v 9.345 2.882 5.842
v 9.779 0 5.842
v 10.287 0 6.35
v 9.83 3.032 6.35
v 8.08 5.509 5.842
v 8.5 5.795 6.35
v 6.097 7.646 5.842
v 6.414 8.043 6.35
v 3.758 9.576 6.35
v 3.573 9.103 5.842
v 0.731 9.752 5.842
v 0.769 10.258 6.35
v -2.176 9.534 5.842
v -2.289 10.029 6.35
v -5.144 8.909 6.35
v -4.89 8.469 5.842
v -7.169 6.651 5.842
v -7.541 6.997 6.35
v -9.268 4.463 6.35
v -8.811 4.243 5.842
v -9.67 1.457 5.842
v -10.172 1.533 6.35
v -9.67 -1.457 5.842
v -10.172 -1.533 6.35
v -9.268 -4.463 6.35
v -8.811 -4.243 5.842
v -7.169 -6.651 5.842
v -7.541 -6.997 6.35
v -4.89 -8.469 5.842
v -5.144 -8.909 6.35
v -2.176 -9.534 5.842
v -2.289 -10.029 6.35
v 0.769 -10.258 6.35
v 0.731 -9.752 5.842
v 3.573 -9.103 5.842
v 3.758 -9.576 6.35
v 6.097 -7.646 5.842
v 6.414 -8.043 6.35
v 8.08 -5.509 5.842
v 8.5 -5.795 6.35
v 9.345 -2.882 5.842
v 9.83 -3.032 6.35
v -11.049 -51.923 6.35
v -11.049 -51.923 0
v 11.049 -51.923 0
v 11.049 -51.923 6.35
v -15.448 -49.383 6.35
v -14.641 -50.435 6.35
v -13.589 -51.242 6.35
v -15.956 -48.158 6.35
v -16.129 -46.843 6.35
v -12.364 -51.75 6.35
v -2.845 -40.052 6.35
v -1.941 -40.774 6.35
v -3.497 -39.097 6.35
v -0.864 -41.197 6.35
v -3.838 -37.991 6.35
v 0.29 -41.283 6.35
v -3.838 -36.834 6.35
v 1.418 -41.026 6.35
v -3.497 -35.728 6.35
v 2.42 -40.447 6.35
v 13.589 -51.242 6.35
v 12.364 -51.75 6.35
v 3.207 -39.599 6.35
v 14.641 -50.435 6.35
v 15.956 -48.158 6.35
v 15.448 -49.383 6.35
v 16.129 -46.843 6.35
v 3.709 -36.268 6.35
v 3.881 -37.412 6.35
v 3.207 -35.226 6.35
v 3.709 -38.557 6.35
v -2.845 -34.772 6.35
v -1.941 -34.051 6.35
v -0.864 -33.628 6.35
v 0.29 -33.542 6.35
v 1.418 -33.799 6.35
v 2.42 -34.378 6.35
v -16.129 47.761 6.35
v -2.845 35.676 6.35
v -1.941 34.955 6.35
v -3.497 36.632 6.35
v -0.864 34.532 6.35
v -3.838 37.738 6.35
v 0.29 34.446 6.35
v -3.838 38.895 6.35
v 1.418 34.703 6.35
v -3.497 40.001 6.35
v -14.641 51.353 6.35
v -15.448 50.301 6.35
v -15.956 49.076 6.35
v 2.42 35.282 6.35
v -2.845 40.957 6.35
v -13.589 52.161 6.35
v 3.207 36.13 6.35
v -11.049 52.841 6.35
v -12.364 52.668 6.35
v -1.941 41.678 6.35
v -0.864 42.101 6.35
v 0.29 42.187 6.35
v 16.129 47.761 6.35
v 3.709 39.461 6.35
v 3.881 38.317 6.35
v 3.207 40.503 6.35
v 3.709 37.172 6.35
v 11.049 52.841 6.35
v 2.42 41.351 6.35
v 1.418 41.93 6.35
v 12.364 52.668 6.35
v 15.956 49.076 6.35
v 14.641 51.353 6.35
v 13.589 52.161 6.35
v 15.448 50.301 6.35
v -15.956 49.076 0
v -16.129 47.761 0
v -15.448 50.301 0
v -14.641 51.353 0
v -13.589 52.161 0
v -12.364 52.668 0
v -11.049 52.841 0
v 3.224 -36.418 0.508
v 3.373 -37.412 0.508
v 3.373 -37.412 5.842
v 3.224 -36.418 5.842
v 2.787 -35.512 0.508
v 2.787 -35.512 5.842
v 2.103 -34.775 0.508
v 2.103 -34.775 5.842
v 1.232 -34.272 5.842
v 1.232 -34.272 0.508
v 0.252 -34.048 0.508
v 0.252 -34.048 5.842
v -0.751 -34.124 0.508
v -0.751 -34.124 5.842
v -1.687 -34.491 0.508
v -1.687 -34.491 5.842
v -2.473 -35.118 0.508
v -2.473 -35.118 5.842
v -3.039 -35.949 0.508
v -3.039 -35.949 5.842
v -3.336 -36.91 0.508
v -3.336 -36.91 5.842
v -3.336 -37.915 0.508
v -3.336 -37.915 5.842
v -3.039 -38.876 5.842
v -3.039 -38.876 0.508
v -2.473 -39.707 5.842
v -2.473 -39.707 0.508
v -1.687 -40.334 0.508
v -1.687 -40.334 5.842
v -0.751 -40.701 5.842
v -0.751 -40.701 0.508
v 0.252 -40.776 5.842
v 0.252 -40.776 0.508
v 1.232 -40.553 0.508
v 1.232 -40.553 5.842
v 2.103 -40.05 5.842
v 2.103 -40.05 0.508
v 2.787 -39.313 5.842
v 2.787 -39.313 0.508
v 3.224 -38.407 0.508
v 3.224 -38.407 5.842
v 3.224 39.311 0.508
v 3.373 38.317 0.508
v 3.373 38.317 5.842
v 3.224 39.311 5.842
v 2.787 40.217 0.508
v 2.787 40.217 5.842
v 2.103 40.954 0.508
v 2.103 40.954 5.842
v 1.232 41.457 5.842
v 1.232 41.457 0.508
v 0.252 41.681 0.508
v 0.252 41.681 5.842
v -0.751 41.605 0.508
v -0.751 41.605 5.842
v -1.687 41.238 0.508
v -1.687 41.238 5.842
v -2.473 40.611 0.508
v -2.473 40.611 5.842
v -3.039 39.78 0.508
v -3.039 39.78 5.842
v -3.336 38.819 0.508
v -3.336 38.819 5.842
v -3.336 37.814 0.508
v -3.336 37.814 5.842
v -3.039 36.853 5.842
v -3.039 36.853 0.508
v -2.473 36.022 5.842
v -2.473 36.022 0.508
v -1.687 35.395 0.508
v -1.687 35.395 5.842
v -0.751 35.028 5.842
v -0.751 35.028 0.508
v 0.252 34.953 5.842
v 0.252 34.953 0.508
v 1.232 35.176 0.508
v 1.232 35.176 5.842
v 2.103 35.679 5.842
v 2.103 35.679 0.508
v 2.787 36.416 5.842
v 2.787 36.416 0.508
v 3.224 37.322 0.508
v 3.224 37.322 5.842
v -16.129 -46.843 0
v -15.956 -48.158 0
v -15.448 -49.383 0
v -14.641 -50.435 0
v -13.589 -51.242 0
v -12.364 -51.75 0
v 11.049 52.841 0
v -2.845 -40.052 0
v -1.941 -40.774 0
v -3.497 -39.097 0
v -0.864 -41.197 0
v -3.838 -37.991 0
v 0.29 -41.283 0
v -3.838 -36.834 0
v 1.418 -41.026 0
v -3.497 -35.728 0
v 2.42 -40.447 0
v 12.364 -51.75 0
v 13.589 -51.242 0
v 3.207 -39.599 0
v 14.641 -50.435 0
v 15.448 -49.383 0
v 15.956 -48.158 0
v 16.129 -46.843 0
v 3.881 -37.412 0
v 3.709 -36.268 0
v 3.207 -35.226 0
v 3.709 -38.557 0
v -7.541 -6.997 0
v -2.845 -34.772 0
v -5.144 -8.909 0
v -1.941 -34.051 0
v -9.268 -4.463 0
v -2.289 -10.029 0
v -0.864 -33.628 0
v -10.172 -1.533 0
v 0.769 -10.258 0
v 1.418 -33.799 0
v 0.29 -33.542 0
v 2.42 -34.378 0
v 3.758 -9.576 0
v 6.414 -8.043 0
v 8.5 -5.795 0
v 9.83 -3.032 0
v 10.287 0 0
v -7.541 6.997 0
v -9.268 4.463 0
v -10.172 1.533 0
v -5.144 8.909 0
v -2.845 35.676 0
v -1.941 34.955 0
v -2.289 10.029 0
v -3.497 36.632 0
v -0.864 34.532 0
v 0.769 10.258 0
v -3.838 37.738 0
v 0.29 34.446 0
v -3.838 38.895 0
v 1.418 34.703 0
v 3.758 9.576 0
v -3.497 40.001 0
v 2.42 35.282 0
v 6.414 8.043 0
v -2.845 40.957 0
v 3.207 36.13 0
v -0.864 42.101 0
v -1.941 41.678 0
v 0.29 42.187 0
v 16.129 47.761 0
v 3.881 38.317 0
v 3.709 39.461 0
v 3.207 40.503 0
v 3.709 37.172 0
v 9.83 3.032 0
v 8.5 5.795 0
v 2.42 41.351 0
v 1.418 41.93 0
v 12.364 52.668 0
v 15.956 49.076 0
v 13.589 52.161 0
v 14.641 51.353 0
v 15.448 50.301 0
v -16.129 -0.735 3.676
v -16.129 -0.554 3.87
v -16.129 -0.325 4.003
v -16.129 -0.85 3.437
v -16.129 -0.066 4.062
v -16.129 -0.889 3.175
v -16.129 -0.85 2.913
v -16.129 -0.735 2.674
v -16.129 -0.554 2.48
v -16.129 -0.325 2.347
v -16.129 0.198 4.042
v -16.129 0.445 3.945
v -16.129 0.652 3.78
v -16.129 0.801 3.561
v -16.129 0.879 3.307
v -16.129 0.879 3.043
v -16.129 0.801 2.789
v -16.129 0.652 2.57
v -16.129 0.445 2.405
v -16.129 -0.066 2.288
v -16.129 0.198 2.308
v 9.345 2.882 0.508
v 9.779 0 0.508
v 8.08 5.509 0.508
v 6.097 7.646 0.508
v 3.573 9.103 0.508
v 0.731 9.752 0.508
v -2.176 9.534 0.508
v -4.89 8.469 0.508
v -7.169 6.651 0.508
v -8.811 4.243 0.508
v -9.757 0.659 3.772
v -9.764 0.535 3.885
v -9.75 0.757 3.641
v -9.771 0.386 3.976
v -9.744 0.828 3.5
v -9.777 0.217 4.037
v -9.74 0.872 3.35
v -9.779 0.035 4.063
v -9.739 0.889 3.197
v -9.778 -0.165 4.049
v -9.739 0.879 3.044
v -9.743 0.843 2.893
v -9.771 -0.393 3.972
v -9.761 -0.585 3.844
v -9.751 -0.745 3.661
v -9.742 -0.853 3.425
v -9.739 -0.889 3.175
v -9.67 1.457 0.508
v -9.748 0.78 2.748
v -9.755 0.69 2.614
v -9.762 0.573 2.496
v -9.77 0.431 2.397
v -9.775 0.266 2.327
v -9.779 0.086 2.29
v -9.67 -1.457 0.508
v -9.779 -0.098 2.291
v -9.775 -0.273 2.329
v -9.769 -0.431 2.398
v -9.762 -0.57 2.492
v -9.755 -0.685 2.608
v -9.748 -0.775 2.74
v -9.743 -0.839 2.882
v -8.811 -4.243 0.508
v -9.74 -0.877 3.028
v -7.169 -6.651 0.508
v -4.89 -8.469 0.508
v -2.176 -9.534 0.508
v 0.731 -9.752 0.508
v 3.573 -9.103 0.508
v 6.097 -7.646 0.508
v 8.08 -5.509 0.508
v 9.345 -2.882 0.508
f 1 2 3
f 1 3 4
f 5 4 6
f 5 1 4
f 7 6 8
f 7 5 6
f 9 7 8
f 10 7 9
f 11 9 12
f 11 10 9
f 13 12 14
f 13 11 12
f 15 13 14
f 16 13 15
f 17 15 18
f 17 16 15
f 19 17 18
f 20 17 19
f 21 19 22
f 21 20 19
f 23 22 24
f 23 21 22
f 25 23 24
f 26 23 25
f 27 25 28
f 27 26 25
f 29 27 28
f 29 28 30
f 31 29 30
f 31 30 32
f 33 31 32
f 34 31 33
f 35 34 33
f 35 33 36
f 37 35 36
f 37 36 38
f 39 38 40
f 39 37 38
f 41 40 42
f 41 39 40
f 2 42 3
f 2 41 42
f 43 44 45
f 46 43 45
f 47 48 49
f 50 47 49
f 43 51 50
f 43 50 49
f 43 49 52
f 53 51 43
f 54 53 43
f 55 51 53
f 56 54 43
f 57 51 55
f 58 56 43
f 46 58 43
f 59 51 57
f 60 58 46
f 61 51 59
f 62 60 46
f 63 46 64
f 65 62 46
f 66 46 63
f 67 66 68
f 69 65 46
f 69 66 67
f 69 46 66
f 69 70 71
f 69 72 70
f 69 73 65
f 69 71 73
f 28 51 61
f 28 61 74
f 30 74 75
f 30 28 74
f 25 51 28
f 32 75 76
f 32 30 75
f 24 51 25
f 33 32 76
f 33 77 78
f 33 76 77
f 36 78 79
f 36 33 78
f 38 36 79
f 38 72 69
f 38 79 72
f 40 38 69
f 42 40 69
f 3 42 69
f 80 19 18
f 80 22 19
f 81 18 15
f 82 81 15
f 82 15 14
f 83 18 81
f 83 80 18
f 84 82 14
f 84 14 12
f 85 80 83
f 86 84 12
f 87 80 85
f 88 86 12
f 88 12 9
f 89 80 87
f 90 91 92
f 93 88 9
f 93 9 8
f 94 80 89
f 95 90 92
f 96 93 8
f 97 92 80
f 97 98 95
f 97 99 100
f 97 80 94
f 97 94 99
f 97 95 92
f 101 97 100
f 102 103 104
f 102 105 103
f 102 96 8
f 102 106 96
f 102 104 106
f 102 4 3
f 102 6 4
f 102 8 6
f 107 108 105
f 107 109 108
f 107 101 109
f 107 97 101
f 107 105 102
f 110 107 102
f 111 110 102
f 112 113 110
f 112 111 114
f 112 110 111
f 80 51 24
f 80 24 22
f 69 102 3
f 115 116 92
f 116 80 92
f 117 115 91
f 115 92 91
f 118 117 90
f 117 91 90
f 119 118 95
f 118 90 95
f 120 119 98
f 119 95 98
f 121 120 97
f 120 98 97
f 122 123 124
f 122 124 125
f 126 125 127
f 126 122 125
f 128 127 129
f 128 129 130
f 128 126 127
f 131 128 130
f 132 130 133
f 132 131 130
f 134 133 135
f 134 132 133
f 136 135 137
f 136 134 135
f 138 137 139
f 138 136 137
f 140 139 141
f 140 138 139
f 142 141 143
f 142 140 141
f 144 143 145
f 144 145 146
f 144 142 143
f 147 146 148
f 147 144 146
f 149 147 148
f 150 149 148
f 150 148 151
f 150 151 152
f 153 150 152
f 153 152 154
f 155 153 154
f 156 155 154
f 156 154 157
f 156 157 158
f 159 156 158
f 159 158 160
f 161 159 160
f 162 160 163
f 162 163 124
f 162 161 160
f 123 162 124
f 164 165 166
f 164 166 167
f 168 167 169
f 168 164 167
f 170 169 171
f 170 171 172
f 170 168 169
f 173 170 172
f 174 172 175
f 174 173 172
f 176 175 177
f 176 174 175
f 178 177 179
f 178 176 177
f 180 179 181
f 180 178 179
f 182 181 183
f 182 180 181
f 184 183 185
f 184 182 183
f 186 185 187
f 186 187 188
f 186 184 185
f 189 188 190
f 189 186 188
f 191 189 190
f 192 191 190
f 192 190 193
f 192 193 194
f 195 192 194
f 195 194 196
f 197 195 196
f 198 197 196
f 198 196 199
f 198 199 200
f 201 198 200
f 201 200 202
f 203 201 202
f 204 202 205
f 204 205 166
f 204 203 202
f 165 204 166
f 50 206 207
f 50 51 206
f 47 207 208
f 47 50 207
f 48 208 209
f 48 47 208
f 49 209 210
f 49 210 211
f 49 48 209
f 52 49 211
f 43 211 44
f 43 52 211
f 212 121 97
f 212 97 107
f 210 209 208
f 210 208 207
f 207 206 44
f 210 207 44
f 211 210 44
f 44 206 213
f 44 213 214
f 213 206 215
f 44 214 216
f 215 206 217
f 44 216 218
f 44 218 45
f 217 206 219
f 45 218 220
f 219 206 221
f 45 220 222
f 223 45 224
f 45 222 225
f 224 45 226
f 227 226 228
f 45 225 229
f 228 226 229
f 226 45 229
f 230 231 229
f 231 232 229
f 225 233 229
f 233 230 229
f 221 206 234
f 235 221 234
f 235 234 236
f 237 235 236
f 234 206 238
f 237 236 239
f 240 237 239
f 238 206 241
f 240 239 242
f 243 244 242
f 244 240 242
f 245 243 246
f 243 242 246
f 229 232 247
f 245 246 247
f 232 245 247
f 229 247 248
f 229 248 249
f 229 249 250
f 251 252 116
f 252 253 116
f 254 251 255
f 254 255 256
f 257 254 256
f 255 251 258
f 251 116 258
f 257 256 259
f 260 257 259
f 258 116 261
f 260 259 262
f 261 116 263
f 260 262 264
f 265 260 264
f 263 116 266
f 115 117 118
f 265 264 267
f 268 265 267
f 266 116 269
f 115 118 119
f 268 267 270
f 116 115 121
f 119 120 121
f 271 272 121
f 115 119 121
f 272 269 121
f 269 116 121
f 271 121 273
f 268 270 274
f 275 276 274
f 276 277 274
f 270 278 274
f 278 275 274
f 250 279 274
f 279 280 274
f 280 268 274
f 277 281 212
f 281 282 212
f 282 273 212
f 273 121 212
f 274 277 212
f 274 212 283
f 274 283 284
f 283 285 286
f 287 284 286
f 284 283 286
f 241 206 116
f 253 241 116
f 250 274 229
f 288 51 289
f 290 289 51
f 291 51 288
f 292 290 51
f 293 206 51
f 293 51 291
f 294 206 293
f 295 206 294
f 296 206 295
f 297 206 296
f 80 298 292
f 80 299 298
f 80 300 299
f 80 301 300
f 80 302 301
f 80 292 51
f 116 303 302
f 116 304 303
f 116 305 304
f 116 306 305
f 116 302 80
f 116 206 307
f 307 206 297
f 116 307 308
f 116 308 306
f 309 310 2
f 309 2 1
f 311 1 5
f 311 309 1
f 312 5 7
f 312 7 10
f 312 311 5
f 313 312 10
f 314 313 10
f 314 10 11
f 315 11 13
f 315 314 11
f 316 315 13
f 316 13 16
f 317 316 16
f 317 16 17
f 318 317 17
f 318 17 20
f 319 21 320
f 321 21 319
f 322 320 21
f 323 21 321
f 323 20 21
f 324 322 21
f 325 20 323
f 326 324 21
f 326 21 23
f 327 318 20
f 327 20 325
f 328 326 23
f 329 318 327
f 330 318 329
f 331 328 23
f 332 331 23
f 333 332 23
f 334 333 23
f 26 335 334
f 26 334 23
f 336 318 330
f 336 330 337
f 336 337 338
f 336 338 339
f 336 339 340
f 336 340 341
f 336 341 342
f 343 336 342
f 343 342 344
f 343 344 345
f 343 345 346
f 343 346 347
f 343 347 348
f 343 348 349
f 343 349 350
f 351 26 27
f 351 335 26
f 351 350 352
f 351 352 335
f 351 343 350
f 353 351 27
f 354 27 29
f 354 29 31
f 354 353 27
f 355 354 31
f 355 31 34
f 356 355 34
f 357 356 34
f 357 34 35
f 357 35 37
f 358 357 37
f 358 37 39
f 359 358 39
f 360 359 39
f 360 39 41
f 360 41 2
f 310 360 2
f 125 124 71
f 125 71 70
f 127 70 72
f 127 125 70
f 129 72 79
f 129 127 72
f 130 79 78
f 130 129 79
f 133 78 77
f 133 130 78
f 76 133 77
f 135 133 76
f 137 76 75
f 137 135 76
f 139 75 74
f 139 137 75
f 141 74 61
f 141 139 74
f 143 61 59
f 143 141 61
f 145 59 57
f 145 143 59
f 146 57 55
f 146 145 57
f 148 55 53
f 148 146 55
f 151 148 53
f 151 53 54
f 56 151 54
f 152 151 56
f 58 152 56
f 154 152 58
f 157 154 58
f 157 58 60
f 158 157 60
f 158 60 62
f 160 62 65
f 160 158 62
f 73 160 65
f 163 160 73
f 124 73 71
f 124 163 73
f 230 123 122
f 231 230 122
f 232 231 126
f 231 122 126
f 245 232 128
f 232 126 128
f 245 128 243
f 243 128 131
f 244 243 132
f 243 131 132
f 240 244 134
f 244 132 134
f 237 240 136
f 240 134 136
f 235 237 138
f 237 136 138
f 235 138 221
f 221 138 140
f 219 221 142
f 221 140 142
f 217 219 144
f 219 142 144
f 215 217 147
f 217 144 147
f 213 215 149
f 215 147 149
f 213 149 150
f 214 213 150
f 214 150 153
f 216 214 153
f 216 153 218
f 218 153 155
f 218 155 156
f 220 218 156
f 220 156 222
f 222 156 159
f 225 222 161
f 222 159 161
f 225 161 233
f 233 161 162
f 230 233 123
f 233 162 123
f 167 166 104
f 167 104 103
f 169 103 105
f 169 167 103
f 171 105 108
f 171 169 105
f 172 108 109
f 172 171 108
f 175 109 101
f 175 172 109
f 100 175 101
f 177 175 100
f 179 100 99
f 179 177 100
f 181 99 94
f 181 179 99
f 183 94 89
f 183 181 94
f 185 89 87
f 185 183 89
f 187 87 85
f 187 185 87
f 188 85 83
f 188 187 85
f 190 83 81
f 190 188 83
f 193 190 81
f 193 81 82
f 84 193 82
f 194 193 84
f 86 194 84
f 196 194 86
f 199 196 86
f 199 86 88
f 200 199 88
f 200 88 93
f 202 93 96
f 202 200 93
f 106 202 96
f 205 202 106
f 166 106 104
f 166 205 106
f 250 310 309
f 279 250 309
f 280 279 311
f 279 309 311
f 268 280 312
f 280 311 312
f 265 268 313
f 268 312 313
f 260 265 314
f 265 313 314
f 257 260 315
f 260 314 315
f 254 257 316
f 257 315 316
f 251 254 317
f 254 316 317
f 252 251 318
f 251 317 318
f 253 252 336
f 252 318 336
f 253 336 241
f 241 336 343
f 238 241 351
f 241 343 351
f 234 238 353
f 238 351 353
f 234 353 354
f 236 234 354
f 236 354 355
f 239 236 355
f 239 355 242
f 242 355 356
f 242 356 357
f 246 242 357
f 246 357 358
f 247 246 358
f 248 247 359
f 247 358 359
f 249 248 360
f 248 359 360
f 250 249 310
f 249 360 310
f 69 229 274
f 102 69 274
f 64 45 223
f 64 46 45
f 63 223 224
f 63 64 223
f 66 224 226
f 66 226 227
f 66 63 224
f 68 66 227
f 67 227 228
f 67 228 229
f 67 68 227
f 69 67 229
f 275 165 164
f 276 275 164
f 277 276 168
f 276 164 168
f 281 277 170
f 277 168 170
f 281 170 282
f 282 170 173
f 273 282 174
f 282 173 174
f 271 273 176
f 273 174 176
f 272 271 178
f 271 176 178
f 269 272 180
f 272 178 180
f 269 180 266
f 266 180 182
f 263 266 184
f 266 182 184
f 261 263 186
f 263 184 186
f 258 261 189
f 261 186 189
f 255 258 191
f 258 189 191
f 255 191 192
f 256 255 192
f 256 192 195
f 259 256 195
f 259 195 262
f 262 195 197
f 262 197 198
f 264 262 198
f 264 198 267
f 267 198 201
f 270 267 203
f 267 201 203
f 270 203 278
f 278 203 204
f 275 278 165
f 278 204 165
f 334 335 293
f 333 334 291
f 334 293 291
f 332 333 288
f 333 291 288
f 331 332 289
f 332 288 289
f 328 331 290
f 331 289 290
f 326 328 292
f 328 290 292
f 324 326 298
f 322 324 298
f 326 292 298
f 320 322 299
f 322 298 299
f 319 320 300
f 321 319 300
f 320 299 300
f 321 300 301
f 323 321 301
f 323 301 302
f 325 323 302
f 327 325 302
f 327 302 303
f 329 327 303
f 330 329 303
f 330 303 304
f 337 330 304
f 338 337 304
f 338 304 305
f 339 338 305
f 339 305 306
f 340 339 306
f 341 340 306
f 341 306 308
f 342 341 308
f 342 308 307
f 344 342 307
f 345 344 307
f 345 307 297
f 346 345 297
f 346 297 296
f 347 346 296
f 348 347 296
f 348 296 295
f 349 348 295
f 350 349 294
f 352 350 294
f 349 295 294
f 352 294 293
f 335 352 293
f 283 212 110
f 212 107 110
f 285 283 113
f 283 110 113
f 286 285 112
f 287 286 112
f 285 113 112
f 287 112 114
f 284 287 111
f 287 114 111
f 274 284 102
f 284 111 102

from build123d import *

# Parameters (mm, degrees)
F0_W     = 32.258
F0_H     = 104.7641299665
F0_R     = 3.3734375
F0_R_2   = 9.779
F1_DEPTH = 6.35
F2_R     = 0.889
F3_DEPTH = 6.3914930276
F4_R     = 5.08
F5_SIZE  = 0.508


with BuildPart() as f1:
    # F0 (on Top) → F1 (new body)
    with BuildSketch(Plane.XY):
        with Locations((0, 0.4591811448)):
            Rectangle(F0_W, F0_H)
        with Locations((0, -37.4124510398)):
            Circle(F0_R, mode=Mode.SUBTRACT)
        Circle(F0_R_2, mode=Mode.SUBTRACT)
        with Locations((0, 38.3165156772)):
            Circle(F0_R, mode=Mode.SUBTRACT)
    extrude(amount=F1_DEPTH)

    # F2 (on face) → F3 (cut, through all)
    with BuildSketch(Plane(origin=(-16.129, 0, 0), x_dir=(0, -1, 0), z_dir=(-1, 0, 0))):
        with Locations((0, 3.175)):
            Circle(F2_R)
    extrude(amount=-F3_DEPTH, mode=Mode.SUBTRACT)

    # F4
    f4_edges = [f1.edges().sort_by_distance(p)[0] for p in [
        (-16.129, 52.841246, 3.175),
        (-16.129, -51.922884, 3.175),
        (16.129, -51.922884, 3.175),
        (16.129, 52.841246, 3.175),
    ]]
    fillet(f4_edges, radius=F4_R)

    # F5
    f5_edges = [f1.edges().sort_by_distance(p)[0] for p in [
        (-3.373437, 38.316516, 6.35),
        (-3.373437, 38.316516, 0),
        (-9.779, 0, 0),
        (-3.373437, -37.412451, 0),
        (-3.373437, -37.412451, 6.35),
        (-9.779, 0, 6.35),
    ]]
    chamfer(f5_edges, length=F5_SIZE)


solid = f1.part
